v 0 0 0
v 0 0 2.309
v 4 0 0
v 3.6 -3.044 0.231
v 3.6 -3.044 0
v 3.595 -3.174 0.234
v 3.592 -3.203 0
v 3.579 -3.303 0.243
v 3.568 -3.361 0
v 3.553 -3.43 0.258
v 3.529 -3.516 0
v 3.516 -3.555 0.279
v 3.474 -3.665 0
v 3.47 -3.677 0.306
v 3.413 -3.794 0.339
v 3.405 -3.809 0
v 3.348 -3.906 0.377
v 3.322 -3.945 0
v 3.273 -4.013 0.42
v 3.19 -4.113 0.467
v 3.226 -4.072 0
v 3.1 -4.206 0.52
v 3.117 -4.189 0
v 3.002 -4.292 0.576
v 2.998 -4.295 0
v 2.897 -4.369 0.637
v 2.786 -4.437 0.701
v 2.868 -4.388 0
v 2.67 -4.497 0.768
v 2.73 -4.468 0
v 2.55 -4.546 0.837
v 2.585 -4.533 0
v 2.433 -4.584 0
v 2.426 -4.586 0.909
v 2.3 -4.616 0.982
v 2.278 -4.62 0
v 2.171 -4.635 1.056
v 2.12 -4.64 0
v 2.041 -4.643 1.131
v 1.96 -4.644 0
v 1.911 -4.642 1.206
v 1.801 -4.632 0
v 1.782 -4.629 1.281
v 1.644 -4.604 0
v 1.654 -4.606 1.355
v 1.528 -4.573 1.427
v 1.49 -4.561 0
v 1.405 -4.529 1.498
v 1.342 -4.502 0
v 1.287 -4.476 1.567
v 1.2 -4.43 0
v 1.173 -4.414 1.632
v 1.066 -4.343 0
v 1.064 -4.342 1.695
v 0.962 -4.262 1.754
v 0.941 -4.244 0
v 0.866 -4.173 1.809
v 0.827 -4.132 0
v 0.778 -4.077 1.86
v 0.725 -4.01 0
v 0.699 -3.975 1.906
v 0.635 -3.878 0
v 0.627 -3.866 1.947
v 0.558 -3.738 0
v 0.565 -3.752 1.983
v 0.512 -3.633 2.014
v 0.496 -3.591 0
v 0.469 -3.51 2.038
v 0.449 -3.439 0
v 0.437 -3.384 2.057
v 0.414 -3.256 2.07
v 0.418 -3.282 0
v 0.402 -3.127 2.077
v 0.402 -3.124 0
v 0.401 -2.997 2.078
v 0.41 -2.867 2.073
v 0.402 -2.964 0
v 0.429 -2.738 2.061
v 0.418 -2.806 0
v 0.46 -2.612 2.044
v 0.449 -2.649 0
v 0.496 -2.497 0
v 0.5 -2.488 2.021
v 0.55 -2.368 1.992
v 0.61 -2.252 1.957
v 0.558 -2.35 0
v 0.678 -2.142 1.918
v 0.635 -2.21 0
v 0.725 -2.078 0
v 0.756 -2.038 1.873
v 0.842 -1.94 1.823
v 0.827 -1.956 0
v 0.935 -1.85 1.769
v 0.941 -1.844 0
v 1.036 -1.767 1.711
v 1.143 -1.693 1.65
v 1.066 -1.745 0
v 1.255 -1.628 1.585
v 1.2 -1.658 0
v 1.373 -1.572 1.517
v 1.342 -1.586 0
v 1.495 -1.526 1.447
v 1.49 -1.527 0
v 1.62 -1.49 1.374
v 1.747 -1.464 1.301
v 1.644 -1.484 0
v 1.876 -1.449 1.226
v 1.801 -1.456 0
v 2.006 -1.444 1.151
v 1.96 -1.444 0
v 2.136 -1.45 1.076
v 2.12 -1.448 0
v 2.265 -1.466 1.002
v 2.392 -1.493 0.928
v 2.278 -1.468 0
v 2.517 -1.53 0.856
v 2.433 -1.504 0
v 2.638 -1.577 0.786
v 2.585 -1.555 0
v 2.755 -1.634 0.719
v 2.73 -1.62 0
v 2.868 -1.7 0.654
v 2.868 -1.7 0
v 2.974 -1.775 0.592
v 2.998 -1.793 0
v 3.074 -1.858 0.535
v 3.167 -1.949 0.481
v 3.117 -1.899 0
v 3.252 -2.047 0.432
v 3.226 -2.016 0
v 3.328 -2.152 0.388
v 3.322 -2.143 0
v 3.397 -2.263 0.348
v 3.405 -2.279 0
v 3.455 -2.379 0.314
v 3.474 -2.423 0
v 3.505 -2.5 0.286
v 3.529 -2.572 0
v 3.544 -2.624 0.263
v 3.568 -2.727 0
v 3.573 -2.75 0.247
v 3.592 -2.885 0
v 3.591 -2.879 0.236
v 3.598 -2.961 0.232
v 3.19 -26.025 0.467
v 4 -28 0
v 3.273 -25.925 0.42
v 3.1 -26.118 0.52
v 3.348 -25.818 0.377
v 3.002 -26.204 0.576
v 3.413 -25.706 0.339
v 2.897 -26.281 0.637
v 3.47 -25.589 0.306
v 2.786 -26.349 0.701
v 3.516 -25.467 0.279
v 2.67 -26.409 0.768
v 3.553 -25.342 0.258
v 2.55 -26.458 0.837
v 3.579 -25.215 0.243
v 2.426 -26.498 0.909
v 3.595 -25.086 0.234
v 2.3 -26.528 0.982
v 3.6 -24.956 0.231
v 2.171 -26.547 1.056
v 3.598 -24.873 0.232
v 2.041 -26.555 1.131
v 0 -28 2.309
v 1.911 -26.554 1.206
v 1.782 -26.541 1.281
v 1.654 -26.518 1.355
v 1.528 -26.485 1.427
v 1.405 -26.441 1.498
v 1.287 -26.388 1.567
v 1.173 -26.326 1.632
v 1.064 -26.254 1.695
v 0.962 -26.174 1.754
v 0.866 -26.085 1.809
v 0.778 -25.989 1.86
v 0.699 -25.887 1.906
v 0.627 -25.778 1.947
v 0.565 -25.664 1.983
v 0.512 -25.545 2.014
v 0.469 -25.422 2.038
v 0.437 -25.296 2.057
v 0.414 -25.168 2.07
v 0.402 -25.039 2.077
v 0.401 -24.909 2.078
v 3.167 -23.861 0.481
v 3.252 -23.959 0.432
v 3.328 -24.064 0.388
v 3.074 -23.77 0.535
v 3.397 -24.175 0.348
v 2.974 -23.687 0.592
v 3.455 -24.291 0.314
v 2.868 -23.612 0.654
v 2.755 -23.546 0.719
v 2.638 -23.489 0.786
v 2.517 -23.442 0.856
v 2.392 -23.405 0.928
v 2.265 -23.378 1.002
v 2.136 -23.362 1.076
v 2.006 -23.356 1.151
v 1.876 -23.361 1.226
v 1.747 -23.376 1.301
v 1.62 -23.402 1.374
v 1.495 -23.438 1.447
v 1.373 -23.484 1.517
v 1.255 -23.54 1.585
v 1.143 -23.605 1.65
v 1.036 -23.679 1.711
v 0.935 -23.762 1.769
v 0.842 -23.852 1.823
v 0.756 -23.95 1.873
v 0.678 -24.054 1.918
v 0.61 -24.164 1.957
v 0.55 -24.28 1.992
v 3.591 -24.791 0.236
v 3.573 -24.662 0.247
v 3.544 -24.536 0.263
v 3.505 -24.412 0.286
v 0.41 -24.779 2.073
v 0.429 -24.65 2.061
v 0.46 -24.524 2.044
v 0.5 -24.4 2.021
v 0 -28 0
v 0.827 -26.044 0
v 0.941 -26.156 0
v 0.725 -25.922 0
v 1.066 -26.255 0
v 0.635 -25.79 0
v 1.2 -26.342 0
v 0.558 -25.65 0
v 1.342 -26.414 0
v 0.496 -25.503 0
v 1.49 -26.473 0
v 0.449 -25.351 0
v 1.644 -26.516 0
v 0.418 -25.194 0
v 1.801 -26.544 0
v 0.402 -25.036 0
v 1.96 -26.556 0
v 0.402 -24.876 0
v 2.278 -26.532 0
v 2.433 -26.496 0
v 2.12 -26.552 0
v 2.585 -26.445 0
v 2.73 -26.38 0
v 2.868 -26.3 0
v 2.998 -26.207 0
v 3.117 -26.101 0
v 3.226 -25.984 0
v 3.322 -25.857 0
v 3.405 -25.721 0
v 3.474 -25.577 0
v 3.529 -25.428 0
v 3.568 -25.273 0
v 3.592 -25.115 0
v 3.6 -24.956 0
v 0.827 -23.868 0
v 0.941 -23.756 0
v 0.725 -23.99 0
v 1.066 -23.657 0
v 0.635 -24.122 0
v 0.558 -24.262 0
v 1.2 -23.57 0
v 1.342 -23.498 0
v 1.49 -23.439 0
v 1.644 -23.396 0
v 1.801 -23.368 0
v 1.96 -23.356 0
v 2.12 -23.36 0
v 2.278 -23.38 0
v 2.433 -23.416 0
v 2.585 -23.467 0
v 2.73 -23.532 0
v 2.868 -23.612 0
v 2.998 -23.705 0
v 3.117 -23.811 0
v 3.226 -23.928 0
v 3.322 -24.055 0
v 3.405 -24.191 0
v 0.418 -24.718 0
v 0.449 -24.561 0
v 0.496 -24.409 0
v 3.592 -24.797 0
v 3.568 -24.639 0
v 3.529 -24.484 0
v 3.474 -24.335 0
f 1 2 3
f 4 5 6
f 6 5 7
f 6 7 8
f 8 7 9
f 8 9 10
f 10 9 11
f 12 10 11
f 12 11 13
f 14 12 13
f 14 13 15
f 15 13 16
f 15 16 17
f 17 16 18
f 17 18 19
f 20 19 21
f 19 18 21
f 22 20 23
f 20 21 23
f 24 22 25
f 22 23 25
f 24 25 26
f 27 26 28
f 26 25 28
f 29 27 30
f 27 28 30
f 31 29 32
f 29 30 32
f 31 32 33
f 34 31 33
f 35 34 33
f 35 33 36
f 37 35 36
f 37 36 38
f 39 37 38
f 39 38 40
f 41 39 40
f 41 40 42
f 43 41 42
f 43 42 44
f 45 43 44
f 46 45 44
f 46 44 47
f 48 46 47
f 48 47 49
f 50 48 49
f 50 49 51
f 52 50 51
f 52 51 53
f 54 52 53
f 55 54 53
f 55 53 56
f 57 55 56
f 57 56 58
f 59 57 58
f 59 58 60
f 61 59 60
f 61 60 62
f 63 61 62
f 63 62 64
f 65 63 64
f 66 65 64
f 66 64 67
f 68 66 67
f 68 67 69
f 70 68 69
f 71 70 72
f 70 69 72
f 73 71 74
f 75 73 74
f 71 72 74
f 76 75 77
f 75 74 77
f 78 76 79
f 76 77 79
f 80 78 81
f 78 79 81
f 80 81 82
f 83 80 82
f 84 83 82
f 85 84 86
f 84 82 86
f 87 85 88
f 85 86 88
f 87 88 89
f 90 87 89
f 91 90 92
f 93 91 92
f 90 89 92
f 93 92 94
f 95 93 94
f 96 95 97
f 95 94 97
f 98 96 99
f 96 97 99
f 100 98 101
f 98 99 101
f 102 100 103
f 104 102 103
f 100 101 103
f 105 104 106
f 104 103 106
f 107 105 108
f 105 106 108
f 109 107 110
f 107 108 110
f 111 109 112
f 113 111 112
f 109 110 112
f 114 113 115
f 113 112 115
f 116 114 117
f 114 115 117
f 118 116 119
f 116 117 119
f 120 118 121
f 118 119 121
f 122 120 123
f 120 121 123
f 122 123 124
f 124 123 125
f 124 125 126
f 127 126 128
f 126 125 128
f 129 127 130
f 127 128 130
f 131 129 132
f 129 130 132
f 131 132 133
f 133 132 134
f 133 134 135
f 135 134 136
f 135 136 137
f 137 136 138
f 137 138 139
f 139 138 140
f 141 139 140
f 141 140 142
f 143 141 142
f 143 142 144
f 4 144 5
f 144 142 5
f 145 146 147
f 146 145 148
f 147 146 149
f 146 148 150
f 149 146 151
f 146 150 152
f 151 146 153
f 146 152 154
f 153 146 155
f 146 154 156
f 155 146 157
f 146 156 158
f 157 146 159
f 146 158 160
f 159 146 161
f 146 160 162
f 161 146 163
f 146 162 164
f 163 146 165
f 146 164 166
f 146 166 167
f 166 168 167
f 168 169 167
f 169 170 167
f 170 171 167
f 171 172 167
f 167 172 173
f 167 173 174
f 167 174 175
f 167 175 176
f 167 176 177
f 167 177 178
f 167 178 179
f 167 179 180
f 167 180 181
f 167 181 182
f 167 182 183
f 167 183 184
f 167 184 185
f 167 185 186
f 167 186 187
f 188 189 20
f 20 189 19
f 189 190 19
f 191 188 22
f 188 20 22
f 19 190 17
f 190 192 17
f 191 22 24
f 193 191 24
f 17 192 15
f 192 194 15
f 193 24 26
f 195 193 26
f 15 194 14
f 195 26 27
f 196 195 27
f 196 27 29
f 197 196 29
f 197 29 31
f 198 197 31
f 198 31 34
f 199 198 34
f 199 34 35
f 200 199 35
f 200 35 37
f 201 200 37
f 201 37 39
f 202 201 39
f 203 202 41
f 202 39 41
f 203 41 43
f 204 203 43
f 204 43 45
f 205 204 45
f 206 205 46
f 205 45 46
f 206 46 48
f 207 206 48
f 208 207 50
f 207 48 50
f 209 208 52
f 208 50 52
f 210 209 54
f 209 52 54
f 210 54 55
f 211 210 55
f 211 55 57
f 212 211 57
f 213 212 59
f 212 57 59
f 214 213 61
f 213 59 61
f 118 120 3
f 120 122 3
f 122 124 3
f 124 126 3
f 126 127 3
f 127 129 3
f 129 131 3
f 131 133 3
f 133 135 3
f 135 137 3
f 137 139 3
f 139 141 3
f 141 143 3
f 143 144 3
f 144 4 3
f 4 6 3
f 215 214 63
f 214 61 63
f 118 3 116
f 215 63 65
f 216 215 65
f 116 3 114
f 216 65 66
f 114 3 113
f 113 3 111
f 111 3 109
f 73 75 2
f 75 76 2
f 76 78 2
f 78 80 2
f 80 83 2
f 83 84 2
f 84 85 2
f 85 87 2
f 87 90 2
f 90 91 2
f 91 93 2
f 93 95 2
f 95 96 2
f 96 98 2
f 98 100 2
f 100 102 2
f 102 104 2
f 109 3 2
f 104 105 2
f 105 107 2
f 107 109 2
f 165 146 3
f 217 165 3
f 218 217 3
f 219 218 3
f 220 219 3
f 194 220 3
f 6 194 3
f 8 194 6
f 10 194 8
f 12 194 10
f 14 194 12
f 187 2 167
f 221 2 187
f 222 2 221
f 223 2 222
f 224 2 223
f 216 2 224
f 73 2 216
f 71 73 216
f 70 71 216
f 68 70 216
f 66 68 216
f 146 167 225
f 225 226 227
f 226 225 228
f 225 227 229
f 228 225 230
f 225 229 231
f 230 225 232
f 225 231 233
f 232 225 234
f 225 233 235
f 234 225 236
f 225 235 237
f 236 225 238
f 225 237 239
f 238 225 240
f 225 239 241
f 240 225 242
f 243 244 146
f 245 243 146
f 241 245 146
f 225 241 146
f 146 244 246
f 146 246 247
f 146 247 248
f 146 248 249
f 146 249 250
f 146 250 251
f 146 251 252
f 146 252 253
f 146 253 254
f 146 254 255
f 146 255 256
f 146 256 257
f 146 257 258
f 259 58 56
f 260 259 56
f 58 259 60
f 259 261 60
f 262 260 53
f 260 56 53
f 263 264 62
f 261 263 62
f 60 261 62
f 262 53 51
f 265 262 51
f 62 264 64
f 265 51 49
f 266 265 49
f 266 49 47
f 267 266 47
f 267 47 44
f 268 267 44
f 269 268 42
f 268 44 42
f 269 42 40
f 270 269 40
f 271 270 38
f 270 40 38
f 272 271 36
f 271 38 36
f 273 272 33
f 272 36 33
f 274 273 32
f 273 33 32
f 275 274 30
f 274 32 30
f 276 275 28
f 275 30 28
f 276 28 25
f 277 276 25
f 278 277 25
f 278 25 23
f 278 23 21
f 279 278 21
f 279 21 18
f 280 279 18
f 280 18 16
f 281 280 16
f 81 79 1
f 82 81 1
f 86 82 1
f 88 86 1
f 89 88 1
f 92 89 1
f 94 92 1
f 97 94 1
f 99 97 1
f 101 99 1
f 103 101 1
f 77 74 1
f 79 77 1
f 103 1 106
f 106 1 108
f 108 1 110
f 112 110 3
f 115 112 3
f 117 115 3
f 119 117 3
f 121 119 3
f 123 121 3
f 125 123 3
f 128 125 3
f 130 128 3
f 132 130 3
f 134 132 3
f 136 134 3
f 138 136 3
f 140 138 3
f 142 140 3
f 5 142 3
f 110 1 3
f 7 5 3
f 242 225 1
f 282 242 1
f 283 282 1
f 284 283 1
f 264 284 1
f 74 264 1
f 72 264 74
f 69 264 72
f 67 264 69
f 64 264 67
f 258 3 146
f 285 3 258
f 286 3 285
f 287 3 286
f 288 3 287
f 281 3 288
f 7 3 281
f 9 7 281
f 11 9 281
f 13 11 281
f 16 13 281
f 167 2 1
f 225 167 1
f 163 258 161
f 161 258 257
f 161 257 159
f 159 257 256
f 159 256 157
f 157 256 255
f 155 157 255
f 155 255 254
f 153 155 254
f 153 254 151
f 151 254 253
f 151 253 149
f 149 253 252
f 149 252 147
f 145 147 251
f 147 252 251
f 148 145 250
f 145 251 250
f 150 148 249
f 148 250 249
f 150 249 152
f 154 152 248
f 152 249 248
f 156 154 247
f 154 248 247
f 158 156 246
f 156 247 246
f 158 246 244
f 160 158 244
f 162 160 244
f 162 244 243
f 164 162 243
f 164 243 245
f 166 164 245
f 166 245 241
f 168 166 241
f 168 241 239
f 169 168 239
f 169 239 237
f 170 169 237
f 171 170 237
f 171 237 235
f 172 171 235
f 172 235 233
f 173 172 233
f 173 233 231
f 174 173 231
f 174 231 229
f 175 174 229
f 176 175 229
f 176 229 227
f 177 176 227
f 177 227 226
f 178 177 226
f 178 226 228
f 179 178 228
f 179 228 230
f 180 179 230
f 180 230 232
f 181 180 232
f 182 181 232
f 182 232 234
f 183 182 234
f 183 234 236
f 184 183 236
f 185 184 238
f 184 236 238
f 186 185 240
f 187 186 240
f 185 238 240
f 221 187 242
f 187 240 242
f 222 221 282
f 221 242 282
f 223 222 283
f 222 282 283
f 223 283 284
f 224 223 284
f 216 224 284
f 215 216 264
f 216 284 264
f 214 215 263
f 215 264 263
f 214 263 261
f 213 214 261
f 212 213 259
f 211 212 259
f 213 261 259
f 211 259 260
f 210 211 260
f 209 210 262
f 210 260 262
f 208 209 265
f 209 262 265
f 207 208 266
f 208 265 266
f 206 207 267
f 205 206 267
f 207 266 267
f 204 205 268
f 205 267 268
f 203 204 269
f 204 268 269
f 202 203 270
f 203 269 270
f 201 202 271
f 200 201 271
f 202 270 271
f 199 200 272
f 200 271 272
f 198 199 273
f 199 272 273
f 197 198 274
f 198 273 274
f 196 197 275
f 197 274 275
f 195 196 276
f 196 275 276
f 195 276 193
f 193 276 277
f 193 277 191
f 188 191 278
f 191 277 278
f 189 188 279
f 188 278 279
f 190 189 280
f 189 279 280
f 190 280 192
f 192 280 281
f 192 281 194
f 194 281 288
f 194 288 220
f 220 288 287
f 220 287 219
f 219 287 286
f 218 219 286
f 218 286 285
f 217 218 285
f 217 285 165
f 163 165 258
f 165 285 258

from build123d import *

# Parameters (mm, degrees)
F1_DEPTH = 28
F3_D     = 3
F3_DEPTH = 14.4
F2_R     = 1.6
F4_DEPTH = 25


with BuildPart() as f1:
    # F0 (on Front) → F1 (new body)
    with BuildSketch(Plane.XZ):
        Polygon((0, 2.309401), (0, 0), (4, 0), align=None)
    extrude(amount=F1_DEPTH)

    # F3
    with Locations(Plane(origin=(0, 0, 0), x_dir=(1, 0, 0), z_dir=(0, 0, -1))):
        with Locations((2, 24.956)):
            Hole(F3_D / 2, depth=F3_DEPTH)

    # F2 (on face) → F4 (cut)
    with BuildSketch(Plane(origin=(0, 0, 0), x_dir=(1, 0, 0), z_dir=(0, 0, -1))):
        with Locations((2, 24.956)):
            Circle(F2_R)
        with Locations((2, 3.044)):
            Circle(F2_R)
    extrude(amount=-F4_DEPTH, mode=Mode.SUBTRACT)


solid = f1.part
